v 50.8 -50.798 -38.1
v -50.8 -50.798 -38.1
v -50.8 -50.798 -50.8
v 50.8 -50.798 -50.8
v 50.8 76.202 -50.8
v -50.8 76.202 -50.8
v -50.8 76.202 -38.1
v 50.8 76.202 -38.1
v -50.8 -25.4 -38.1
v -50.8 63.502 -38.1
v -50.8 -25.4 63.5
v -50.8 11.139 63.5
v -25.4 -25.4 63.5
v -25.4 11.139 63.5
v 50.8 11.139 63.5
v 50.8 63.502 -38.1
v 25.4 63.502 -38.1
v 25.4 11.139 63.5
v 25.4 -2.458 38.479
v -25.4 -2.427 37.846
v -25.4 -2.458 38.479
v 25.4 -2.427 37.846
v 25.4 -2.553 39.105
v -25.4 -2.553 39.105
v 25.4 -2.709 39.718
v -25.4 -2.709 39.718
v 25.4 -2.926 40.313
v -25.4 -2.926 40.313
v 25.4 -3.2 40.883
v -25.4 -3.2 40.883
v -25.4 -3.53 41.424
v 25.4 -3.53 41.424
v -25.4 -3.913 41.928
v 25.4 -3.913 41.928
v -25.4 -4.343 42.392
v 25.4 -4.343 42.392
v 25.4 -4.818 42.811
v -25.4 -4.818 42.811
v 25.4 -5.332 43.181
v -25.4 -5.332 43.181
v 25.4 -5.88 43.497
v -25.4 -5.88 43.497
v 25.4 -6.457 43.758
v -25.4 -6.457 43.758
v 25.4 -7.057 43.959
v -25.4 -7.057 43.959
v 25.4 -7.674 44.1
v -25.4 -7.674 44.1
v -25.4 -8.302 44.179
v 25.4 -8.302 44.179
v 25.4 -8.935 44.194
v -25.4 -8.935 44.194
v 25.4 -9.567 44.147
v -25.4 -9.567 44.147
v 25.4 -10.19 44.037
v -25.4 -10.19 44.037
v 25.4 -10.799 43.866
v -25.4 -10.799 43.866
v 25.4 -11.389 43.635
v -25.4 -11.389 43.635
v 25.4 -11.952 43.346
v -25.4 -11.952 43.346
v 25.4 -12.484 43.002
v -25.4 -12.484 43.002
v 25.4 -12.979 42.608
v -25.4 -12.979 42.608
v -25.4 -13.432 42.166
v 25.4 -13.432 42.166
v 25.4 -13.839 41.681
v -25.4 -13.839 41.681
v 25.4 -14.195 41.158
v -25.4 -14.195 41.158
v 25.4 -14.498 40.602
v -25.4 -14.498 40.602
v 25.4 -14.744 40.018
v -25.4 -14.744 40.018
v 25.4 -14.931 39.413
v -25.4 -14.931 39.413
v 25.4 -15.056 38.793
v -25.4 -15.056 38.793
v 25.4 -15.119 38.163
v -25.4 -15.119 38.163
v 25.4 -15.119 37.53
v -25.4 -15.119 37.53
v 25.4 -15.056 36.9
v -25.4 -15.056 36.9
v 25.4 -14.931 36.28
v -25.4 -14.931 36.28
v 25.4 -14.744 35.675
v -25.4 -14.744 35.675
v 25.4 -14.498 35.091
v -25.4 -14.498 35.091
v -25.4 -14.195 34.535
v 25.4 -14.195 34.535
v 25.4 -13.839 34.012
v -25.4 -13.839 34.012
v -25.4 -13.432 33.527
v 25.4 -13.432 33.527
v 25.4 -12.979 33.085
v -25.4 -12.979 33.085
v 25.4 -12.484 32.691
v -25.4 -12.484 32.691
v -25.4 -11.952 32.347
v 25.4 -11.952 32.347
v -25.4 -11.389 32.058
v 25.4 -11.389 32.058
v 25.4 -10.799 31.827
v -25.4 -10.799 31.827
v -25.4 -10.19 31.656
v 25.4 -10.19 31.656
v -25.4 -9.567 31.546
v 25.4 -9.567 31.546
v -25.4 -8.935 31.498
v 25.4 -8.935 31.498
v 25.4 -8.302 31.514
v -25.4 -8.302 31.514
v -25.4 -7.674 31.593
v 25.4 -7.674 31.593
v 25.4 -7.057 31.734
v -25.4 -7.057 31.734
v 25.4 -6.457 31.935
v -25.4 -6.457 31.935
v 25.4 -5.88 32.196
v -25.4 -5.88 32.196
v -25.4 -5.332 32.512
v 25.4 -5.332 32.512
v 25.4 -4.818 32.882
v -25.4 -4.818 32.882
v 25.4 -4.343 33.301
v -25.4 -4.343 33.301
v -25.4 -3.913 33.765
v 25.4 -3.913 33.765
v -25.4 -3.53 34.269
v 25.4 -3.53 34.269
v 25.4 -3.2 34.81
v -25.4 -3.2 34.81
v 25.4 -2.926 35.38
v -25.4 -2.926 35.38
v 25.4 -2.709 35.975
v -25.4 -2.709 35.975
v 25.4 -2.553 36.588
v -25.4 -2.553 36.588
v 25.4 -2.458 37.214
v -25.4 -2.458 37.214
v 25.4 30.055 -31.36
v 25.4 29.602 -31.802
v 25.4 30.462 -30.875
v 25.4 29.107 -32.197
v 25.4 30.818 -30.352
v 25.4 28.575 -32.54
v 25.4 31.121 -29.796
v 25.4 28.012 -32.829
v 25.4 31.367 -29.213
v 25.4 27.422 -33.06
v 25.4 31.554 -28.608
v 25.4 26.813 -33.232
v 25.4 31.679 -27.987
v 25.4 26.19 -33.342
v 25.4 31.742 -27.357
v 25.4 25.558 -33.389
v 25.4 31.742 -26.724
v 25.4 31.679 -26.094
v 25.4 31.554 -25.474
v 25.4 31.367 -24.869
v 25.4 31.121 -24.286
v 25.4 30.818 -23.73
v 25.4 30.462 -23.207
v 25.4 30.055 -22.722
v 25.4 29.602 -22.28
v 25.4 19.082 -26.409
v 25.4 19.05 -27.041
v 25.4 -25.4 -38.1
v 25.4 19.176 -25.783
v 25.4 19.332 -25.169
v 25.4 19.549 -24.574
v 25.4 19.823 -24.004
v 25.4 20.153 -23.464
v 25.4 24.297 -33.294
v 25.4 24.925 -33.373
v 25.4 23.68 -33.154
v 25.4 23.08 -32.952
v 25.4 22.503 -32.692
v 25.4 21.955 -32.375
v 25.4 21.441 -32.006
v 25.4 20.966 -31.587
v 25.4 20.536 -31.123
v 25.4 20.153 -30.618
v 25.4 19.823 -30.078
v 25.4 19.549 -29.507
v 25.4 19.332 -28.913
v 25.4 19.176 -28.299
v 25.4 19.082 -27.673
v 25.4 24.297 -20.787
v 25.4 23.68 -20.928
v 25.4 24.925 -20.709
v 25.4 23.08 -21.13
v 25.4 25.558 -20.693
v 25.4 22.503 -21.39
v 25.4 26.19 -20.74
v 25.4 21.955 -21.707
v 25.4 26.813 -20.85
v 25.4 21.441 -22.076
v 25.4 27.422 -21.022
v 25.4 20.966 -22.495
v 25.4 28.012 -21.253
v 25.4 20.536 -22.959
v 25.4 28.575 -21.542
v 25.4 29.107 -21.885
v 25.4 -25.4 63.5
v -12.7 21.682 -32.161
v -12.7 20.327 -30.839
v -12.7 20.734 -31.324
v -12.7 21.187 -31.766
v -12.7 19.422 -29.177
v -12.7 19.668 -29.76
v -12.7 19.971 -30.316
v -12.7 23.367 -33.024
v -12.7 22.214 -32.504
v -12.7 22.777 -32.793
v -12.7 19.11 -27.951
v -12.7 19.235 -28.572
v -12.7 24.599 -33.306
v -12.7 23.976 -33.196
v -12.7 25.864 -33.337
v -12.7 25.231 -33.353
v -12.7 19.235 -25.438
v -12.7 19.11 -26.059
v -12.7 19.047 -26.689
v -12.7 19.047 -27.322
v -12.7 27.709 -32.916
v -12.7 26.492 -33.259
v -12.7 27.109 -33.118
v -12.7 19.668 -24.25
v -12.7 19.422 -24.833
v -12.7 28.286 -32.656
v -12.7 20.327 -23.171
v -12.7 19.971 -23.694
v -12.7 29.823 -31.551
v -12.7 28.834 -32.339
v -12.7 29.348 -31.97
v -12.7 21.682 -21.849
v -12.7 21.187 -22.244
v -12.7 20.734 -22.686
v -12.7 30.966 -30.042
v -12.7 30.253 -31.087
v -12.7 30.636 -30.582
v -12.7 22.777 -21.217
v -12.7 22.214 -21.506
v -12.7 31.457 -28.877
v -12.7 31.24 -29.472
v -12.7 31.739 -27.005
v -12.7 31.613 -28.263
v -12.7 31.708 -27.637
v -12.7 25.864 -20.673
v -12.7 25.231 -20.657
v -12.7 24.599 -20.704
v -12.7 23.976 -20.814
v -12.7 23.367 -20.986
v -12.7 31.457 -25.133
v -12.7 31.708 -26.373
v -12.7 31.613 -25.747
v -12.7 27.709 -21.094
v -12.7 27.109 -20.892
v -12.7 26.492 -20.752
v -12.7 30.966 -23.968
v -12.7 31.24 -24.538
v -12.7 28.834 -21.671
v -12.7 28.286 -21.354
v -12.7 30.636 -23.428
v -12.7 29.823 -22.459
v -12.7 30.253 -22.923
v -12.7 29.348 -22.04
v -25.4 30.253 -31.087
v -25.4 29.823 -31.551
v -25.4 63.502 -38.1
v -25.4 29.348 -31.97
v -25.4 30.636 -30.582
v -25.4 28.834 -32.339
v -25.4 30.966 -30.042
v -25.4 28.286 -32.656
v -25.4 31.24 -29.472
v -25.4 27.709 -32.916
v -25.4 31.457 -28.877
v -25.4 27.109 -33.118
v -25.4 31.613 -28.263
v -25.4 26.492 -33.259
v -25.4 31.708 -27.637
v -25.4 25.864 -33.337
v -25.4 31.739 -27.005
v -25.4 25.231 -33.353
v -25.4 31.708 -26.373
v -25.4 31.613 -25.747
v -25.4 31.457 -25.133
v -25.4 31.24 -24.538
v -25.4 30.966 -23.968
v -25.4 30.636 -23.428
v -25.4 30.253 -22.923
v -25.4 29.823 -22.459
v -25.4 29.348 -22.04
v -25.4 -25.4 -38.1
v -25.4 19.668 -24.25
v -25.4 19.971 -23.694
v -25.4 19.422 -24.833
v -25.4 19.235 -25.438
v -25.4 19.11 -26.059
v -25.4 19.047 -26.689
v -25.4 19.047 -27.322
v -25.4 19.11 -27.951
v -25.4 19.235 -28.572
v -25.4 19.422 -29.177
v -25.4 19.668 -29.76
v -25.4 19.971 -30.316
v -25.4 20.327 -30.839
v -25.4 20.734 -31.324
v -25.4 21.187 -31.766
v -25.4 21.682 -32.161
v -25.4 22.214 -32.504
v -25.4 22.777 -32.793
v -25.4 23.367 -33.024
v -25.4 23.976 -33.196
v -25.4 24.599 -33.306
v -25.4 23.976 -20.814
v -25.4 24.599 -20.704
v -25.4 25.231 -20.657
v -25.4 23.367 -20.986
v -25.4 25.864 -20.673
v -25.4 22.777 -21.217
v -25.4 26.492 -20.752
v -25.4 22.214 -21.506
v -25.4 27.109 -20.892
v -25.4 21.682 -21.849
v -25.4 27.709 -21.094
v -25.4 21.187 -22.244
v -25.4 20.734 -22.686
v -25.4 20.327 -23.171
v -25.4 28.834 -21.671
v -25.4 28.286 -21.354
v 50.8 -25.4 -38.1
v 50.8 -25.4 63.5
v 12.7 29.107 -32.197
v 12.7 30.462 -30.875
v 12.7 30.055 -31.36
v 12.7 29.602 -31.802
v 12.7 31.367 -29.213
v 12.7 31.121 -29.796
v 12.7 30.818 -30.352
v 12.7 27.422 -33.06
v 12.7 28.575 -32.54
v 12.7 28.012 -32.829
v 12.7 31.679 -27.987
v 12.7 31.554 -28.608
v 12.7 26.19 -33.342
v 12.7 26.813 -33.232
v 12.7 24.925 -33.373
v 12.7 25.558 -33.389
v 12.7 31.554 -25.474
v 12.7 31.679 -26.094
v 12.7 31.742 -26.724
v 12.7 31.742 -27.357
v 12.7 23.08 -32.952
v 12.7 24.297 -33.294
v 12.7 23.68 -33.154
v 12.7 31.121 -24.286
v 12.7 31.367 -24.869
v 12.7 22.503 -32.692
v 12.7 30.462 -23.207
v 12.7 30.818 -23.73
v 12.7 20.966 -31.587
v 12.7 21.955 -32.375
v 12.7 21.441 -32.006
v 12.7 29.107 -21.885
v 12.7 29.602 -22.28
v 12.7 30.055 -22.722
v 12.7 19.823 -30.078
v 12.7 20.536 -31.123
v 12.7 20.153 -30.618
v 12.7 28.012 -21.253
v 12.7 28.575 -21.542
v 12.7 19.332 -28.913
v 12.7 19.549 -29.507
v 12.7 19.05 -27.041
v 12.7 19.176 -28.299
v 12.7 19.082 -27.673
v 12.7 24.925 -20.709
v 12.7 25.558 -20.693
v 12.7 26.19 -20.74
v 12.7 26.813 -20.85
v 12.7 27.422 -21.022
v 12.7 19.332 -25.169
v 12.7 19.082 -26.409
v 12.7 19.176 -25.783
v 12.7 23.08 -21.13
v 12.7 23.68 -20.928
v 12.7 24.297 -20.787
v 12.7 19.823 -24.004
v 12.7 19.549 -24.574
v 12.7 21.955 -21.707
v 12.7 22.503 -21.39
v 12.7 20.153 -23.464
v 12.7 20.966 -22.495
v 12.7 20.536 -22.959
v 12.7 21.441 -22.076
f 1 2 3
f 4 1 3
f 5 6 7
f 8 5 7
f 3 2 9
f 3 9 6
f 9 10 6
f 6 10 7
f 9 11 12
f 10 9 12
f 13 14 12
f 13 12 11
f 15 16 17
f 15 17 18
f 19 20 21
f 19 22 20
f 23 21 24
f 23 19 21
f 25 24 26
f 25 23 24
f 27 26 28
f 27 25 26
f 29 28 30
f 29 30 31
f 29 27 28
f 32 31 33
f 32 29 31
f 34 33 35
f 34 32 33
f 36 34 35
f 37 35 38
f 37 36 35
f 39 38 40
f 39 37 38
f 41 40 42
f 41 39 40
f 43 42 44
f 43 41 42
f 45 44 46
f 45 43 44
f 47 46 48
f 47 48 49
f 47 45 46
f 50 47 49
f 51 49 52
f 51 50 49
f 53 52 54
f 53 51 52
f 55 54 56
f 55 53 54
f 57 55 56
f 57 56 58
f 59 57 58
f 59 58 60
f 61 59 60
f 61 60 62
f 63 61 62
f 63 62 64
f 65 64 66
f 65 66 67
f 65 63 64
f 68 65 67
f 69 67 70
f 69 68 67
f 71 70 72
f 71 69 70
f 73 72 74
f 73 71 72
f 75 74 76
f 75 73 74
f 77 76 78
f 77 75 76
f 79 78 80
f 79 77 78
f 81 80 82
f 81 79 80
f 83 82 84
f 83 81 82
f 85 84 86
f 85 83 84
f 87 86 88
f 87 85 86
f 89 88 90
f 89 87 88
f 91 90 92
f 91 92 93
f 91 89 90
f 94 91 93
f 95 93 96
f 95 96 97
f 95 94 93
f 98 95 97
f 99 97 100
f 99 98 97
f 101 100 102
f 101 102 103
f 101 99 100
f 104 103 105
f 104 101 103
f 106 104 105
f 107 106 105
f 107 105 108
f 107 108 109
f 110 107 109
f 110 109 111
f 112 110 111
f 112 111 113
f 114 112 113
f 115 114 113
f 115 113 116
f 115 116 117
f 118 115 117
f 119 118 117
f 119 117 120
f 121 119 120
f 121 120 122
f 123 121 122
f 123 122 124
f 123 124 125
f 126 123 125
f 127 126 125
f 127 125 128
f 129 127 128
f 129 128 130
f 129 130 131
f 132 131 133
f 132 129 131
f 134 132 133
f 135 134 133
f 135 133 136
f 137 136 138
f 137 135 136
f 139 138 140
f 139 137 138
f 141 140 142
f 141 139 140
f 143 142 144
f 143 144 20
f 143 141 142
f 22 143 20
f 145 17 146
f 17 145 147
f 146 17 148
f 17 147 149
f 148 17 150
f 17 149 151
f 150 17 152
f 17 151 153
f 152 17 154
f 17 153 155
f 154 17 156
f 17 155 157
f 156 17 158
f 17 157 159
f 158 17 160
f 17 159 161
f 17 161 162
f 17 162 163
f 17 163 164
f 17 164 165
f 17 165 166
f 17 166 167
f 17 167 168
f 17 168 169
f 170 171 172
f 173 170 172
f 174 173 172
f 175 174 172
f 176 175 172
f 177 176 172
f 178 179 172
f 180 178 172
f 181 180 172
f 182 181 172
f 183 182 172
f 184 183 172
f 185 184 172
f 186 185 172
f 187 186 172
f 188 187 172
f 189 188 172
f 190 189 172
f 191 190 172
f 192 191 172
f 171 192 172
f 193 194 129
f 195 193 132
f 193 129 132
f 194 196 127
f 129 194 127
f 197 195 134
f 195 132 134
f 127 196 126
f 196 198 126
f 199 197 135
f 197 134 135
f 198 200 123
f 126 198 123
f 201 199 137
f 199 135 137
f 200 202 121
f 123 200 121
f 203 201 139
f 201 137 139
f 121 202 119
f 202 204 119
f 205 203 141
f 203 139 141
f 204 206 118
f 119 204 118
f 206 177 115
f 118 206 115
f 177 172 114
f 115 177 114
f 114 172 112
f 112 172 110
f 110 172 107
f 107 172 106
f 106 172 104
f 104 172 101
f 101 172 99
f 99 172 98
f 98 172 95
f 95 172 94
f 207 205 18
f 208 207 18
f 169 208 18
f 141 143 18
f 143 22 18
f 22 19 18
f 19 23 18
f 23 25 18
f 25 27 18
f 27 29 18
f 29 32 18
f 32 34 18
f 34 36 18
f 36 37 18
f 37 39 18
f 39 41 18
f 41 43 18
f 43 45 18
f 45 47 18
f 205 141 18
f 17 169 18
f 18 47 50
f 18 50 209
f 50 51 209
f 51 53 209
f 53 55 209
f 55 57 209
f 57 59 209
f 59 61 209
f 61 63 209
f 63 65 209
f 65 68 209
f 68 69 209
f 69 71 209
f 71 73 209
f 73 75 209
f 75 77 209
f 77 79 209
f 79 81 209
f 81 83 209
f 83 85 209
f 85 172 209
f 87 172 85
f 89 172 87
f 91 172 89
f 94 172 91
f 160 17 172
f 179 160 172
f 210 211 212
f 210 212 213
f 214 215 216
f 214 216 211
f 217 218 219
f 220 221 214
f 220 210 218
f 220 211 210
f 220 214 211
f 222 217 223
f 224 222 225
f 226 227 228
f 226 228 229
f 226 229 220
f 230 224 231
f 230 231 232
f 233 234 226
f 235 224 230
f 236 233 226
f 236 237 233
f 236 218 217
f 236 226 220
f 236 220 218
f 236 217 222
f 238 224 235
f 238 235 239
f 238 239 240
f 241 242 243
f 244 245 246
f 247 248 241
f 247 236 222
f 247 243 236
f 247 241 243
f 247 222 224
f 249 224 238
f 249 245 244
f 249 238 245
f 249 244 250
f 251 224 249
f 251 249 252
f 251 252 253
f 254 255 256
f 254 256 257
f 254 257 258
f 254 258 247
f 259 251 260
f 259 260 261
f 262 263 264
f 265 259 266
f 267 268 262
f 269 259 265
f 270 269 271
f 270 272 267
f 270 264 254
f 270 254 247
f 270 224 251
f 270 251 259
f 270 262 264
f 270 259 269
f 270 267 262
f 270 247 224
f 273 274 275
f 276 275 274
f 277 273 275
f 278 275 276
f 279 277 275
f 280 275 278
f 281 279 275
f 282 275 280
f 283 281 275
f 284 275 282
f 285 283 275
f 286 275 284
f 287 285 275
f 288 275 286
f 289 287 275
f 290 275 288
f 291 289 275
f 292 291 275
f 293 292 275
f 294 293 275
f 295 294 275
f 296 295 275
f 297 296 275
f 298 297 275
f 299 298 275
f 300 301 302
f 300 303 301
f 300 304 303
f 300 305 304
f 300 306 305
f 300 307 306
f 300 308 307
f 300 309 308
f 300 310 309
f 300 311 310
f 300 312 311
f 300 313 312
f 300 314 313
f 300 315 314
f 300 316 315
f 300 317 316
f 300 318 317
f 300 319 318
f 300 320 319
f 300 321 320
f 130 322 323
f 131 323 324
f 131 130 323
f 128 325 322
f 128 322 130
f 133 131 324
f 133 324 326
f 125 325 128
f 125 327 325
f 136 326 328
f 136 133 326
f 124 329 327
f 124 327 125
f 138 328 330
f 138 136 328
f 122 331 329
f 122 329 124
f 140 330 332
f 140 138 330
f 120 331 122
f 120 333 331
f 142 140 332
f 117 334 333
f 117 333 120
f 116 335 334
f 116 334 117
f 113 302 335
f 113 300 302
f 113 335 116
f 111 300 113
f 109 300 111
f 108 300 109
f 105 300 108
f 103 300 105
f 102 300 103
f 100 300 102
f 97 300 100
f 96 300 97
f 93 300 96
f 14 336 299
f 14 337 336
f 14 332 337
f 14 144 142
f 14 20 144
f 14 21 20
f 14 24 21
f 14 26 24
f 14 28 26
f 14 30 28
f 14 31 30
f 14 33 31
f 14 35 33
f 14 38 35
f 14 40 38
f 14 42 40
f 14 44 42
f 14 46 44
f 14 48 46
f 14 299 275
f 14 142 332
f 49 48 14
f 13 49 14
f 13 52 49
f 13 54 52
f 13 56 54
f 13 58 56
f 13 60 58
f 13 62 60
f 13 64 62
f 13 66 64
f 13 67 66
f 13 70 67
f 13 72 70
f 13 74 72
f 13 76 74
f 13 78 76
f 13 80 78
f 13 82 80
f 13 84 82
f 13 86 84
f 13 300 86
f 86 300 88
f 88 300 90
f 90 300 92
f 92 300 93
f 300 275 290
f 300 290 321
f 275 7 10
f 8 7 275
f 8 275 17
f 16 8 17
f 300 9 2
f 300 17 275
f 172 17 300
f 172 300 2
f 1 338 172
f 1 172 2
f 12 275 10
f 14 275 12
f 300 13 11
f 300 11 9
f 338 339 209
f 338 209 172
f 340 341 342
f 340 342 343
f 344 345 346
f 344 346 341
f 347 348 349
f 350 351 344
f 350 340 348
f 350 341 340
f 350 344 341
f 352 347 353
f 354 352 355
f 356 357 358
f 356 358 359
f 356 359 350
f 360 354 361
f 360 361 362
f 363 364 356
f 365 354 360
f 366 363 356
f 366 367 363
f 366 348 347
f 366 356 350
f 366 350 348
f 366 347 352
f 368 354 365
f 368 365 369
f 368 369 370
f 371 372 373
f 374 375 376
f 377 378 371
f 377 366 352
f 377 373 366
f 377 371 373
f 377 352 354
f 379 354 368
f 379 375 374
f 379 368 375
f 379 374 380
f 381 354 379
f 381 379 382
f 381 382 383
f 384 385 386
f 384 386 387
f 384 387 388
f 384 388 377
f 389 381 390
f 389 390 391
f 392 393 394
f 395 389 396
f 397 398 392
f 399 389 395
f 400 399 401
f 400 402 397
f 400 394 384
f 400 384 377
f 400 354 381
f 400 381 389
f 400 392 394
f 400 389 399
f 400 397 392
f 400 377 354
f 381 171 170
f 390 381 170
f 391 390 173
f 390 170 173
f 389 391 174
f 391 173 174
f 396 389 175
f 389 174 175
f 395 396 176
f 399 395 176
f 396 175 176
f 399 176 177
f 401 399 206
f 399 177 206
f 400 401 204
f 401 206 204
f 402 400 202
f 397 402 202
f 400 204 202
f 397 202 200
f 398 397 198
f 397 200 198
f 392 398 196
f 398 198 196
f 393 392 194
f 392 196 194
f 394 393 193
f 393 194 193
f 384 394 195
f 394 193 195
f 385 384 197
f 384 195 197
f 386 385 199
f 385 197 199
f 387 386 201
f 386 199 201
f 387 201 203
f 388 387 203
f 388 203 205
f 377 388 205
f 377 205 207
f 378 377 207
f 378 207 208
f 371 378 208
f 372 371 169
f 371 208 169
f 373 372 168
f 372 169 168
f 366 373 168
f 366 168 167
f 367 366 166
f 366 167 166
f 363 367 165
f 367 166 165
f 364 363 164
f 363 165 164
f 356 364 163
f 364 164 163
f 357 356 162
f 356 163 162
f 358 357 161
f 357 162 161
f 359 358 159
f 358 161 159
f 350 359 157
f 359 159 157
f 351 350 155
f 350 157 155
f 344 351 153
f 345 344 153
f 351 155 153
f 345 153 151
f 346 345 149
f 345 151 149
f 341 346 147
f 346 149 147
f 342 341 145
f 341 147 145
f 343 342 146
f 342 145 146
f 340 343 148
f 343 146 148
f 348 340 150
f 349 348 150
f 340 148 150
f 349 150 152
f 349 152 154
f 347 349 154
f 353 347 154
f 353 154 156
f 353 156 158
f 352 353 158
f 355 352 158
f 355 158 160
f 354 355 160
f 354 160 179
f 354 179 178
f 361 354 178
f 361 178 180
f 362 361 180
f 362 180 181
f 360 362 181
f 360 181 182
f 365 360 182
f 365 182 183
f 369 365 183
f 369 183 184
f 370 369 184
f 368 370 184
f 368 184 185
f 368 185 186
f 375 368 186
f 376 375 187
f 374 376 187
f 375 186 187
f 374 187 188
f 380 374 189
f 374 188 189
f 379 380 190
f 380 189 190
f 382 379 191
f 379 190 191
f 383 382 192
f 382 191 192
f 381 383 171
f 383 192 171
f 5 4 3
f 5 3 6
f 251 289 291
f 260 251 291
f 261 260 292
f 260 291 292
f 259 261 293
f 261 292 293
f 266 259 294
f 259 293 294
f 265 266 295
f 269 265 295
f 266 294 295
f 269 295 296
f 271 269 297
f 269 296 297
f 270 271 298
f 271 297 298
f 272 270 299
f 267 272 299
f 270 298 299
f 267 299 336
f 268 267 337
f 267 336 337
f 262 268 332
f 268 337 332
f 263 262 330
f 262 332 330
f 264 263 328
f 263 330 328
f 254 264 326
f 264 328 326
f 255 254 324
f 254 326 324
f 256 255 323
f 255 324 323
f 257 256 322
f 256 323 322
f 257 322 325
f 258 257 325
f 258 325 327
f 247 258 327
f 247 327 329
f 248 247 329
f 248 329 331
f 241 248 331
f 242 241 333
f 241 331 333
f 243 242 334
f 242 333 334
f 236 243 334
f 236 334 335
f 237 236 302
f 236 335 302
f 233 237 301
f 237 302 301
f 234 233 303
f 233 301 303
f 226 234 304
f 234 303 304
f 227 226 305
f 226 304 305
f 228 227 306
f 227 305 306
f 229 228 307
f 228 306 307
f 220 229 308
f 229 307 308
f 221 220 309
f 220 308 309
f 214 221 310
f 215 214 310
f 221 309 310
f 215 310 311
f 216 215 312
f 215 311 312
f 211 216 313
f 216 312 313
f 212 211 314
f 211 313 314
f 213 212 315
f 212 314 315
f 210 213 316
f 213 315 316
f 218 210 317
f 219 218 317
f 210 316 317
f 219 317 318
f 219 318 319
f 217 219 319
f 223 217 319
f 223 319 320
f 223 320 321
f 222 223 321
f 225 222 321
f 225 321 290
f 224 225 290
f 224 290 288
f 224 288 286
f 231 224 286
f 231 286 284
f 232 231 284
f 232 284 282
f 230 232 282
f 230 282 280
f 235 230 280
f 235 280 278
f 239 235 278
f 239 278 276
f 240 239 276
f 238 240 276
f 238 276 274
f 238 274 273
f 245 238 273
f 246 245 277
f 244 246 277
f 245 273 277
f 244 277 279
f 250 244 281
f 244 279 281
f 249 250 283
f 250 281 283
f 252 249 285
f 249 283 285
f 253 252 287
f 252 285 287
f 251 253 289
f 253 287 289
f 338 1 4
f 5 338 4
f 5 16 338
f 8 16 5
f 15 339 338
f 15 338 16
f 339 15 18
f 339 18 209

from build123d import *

# Parameters (mm, degrees)
F1_DEPTH = 50.8
F2_W     = 50.8
F2_H     = 101.6
F3_DEPTH = 101.603284
F4_R     = 6.35
F5_DEPTH = 25.4
F6_R     = 6.35
F7_DEPTH = 12.7
F8_R     = 6.35
F9_DEPTH = 12.7


with BuildPart() as f1:
    # F0 (on Right) → F1 (new body, symmetric)
    with BuildSketch(Plane.YZ):
        Polygon((11.138843, 63.5), (-25.4, 63.5), (-25.4, -38.1), (-50.797716, -38.1), (-50.797716, -50.8), (76.202284, -50.8), (76.202284, -38.1), (63.502284, -38.1), align=None)
    extrude(amount=F1_DEPTH, both=True)

    # F2 (on face) → F3 (cut, through all)
    with BuildSketch(Plane.XZ.offset(25.4)):
        with Locations((0, 12.7)):
            Rectangle(F2_W, F2_H)
    extrude(amount=-F3_DEPTH, mode=Mode.SUBTRACT)

    # F4 (on Right) → F5 (join, symmetric)
    with BuildSketch(Plane.YZ):
        with Locations((-8.776936, 37.846457)):
            Circle(F4_R)
    extrude(amount=F5_DEPTH, both=True)

    # F6 (on face) → F7 (join)
    with BuildSketch(Plane.YZ.offset(-25.4)):
        with Locations((25.389081, -27.005039)):
            Circle(F6_R)
    extrude(amount=F7_DEPTH)

    # F8 (on face) → F9 (join)
    with BuildSketch(Plane(origin=(25.4, 0, 0), x_dir=(0, -1, 0), z_dir=(-1, 0, 0))):
        with Locations((-25.4, -27.040878)):
            Circle(F8_R)
    extrude(amount=F9_DEPTH)


solid = f1.part
